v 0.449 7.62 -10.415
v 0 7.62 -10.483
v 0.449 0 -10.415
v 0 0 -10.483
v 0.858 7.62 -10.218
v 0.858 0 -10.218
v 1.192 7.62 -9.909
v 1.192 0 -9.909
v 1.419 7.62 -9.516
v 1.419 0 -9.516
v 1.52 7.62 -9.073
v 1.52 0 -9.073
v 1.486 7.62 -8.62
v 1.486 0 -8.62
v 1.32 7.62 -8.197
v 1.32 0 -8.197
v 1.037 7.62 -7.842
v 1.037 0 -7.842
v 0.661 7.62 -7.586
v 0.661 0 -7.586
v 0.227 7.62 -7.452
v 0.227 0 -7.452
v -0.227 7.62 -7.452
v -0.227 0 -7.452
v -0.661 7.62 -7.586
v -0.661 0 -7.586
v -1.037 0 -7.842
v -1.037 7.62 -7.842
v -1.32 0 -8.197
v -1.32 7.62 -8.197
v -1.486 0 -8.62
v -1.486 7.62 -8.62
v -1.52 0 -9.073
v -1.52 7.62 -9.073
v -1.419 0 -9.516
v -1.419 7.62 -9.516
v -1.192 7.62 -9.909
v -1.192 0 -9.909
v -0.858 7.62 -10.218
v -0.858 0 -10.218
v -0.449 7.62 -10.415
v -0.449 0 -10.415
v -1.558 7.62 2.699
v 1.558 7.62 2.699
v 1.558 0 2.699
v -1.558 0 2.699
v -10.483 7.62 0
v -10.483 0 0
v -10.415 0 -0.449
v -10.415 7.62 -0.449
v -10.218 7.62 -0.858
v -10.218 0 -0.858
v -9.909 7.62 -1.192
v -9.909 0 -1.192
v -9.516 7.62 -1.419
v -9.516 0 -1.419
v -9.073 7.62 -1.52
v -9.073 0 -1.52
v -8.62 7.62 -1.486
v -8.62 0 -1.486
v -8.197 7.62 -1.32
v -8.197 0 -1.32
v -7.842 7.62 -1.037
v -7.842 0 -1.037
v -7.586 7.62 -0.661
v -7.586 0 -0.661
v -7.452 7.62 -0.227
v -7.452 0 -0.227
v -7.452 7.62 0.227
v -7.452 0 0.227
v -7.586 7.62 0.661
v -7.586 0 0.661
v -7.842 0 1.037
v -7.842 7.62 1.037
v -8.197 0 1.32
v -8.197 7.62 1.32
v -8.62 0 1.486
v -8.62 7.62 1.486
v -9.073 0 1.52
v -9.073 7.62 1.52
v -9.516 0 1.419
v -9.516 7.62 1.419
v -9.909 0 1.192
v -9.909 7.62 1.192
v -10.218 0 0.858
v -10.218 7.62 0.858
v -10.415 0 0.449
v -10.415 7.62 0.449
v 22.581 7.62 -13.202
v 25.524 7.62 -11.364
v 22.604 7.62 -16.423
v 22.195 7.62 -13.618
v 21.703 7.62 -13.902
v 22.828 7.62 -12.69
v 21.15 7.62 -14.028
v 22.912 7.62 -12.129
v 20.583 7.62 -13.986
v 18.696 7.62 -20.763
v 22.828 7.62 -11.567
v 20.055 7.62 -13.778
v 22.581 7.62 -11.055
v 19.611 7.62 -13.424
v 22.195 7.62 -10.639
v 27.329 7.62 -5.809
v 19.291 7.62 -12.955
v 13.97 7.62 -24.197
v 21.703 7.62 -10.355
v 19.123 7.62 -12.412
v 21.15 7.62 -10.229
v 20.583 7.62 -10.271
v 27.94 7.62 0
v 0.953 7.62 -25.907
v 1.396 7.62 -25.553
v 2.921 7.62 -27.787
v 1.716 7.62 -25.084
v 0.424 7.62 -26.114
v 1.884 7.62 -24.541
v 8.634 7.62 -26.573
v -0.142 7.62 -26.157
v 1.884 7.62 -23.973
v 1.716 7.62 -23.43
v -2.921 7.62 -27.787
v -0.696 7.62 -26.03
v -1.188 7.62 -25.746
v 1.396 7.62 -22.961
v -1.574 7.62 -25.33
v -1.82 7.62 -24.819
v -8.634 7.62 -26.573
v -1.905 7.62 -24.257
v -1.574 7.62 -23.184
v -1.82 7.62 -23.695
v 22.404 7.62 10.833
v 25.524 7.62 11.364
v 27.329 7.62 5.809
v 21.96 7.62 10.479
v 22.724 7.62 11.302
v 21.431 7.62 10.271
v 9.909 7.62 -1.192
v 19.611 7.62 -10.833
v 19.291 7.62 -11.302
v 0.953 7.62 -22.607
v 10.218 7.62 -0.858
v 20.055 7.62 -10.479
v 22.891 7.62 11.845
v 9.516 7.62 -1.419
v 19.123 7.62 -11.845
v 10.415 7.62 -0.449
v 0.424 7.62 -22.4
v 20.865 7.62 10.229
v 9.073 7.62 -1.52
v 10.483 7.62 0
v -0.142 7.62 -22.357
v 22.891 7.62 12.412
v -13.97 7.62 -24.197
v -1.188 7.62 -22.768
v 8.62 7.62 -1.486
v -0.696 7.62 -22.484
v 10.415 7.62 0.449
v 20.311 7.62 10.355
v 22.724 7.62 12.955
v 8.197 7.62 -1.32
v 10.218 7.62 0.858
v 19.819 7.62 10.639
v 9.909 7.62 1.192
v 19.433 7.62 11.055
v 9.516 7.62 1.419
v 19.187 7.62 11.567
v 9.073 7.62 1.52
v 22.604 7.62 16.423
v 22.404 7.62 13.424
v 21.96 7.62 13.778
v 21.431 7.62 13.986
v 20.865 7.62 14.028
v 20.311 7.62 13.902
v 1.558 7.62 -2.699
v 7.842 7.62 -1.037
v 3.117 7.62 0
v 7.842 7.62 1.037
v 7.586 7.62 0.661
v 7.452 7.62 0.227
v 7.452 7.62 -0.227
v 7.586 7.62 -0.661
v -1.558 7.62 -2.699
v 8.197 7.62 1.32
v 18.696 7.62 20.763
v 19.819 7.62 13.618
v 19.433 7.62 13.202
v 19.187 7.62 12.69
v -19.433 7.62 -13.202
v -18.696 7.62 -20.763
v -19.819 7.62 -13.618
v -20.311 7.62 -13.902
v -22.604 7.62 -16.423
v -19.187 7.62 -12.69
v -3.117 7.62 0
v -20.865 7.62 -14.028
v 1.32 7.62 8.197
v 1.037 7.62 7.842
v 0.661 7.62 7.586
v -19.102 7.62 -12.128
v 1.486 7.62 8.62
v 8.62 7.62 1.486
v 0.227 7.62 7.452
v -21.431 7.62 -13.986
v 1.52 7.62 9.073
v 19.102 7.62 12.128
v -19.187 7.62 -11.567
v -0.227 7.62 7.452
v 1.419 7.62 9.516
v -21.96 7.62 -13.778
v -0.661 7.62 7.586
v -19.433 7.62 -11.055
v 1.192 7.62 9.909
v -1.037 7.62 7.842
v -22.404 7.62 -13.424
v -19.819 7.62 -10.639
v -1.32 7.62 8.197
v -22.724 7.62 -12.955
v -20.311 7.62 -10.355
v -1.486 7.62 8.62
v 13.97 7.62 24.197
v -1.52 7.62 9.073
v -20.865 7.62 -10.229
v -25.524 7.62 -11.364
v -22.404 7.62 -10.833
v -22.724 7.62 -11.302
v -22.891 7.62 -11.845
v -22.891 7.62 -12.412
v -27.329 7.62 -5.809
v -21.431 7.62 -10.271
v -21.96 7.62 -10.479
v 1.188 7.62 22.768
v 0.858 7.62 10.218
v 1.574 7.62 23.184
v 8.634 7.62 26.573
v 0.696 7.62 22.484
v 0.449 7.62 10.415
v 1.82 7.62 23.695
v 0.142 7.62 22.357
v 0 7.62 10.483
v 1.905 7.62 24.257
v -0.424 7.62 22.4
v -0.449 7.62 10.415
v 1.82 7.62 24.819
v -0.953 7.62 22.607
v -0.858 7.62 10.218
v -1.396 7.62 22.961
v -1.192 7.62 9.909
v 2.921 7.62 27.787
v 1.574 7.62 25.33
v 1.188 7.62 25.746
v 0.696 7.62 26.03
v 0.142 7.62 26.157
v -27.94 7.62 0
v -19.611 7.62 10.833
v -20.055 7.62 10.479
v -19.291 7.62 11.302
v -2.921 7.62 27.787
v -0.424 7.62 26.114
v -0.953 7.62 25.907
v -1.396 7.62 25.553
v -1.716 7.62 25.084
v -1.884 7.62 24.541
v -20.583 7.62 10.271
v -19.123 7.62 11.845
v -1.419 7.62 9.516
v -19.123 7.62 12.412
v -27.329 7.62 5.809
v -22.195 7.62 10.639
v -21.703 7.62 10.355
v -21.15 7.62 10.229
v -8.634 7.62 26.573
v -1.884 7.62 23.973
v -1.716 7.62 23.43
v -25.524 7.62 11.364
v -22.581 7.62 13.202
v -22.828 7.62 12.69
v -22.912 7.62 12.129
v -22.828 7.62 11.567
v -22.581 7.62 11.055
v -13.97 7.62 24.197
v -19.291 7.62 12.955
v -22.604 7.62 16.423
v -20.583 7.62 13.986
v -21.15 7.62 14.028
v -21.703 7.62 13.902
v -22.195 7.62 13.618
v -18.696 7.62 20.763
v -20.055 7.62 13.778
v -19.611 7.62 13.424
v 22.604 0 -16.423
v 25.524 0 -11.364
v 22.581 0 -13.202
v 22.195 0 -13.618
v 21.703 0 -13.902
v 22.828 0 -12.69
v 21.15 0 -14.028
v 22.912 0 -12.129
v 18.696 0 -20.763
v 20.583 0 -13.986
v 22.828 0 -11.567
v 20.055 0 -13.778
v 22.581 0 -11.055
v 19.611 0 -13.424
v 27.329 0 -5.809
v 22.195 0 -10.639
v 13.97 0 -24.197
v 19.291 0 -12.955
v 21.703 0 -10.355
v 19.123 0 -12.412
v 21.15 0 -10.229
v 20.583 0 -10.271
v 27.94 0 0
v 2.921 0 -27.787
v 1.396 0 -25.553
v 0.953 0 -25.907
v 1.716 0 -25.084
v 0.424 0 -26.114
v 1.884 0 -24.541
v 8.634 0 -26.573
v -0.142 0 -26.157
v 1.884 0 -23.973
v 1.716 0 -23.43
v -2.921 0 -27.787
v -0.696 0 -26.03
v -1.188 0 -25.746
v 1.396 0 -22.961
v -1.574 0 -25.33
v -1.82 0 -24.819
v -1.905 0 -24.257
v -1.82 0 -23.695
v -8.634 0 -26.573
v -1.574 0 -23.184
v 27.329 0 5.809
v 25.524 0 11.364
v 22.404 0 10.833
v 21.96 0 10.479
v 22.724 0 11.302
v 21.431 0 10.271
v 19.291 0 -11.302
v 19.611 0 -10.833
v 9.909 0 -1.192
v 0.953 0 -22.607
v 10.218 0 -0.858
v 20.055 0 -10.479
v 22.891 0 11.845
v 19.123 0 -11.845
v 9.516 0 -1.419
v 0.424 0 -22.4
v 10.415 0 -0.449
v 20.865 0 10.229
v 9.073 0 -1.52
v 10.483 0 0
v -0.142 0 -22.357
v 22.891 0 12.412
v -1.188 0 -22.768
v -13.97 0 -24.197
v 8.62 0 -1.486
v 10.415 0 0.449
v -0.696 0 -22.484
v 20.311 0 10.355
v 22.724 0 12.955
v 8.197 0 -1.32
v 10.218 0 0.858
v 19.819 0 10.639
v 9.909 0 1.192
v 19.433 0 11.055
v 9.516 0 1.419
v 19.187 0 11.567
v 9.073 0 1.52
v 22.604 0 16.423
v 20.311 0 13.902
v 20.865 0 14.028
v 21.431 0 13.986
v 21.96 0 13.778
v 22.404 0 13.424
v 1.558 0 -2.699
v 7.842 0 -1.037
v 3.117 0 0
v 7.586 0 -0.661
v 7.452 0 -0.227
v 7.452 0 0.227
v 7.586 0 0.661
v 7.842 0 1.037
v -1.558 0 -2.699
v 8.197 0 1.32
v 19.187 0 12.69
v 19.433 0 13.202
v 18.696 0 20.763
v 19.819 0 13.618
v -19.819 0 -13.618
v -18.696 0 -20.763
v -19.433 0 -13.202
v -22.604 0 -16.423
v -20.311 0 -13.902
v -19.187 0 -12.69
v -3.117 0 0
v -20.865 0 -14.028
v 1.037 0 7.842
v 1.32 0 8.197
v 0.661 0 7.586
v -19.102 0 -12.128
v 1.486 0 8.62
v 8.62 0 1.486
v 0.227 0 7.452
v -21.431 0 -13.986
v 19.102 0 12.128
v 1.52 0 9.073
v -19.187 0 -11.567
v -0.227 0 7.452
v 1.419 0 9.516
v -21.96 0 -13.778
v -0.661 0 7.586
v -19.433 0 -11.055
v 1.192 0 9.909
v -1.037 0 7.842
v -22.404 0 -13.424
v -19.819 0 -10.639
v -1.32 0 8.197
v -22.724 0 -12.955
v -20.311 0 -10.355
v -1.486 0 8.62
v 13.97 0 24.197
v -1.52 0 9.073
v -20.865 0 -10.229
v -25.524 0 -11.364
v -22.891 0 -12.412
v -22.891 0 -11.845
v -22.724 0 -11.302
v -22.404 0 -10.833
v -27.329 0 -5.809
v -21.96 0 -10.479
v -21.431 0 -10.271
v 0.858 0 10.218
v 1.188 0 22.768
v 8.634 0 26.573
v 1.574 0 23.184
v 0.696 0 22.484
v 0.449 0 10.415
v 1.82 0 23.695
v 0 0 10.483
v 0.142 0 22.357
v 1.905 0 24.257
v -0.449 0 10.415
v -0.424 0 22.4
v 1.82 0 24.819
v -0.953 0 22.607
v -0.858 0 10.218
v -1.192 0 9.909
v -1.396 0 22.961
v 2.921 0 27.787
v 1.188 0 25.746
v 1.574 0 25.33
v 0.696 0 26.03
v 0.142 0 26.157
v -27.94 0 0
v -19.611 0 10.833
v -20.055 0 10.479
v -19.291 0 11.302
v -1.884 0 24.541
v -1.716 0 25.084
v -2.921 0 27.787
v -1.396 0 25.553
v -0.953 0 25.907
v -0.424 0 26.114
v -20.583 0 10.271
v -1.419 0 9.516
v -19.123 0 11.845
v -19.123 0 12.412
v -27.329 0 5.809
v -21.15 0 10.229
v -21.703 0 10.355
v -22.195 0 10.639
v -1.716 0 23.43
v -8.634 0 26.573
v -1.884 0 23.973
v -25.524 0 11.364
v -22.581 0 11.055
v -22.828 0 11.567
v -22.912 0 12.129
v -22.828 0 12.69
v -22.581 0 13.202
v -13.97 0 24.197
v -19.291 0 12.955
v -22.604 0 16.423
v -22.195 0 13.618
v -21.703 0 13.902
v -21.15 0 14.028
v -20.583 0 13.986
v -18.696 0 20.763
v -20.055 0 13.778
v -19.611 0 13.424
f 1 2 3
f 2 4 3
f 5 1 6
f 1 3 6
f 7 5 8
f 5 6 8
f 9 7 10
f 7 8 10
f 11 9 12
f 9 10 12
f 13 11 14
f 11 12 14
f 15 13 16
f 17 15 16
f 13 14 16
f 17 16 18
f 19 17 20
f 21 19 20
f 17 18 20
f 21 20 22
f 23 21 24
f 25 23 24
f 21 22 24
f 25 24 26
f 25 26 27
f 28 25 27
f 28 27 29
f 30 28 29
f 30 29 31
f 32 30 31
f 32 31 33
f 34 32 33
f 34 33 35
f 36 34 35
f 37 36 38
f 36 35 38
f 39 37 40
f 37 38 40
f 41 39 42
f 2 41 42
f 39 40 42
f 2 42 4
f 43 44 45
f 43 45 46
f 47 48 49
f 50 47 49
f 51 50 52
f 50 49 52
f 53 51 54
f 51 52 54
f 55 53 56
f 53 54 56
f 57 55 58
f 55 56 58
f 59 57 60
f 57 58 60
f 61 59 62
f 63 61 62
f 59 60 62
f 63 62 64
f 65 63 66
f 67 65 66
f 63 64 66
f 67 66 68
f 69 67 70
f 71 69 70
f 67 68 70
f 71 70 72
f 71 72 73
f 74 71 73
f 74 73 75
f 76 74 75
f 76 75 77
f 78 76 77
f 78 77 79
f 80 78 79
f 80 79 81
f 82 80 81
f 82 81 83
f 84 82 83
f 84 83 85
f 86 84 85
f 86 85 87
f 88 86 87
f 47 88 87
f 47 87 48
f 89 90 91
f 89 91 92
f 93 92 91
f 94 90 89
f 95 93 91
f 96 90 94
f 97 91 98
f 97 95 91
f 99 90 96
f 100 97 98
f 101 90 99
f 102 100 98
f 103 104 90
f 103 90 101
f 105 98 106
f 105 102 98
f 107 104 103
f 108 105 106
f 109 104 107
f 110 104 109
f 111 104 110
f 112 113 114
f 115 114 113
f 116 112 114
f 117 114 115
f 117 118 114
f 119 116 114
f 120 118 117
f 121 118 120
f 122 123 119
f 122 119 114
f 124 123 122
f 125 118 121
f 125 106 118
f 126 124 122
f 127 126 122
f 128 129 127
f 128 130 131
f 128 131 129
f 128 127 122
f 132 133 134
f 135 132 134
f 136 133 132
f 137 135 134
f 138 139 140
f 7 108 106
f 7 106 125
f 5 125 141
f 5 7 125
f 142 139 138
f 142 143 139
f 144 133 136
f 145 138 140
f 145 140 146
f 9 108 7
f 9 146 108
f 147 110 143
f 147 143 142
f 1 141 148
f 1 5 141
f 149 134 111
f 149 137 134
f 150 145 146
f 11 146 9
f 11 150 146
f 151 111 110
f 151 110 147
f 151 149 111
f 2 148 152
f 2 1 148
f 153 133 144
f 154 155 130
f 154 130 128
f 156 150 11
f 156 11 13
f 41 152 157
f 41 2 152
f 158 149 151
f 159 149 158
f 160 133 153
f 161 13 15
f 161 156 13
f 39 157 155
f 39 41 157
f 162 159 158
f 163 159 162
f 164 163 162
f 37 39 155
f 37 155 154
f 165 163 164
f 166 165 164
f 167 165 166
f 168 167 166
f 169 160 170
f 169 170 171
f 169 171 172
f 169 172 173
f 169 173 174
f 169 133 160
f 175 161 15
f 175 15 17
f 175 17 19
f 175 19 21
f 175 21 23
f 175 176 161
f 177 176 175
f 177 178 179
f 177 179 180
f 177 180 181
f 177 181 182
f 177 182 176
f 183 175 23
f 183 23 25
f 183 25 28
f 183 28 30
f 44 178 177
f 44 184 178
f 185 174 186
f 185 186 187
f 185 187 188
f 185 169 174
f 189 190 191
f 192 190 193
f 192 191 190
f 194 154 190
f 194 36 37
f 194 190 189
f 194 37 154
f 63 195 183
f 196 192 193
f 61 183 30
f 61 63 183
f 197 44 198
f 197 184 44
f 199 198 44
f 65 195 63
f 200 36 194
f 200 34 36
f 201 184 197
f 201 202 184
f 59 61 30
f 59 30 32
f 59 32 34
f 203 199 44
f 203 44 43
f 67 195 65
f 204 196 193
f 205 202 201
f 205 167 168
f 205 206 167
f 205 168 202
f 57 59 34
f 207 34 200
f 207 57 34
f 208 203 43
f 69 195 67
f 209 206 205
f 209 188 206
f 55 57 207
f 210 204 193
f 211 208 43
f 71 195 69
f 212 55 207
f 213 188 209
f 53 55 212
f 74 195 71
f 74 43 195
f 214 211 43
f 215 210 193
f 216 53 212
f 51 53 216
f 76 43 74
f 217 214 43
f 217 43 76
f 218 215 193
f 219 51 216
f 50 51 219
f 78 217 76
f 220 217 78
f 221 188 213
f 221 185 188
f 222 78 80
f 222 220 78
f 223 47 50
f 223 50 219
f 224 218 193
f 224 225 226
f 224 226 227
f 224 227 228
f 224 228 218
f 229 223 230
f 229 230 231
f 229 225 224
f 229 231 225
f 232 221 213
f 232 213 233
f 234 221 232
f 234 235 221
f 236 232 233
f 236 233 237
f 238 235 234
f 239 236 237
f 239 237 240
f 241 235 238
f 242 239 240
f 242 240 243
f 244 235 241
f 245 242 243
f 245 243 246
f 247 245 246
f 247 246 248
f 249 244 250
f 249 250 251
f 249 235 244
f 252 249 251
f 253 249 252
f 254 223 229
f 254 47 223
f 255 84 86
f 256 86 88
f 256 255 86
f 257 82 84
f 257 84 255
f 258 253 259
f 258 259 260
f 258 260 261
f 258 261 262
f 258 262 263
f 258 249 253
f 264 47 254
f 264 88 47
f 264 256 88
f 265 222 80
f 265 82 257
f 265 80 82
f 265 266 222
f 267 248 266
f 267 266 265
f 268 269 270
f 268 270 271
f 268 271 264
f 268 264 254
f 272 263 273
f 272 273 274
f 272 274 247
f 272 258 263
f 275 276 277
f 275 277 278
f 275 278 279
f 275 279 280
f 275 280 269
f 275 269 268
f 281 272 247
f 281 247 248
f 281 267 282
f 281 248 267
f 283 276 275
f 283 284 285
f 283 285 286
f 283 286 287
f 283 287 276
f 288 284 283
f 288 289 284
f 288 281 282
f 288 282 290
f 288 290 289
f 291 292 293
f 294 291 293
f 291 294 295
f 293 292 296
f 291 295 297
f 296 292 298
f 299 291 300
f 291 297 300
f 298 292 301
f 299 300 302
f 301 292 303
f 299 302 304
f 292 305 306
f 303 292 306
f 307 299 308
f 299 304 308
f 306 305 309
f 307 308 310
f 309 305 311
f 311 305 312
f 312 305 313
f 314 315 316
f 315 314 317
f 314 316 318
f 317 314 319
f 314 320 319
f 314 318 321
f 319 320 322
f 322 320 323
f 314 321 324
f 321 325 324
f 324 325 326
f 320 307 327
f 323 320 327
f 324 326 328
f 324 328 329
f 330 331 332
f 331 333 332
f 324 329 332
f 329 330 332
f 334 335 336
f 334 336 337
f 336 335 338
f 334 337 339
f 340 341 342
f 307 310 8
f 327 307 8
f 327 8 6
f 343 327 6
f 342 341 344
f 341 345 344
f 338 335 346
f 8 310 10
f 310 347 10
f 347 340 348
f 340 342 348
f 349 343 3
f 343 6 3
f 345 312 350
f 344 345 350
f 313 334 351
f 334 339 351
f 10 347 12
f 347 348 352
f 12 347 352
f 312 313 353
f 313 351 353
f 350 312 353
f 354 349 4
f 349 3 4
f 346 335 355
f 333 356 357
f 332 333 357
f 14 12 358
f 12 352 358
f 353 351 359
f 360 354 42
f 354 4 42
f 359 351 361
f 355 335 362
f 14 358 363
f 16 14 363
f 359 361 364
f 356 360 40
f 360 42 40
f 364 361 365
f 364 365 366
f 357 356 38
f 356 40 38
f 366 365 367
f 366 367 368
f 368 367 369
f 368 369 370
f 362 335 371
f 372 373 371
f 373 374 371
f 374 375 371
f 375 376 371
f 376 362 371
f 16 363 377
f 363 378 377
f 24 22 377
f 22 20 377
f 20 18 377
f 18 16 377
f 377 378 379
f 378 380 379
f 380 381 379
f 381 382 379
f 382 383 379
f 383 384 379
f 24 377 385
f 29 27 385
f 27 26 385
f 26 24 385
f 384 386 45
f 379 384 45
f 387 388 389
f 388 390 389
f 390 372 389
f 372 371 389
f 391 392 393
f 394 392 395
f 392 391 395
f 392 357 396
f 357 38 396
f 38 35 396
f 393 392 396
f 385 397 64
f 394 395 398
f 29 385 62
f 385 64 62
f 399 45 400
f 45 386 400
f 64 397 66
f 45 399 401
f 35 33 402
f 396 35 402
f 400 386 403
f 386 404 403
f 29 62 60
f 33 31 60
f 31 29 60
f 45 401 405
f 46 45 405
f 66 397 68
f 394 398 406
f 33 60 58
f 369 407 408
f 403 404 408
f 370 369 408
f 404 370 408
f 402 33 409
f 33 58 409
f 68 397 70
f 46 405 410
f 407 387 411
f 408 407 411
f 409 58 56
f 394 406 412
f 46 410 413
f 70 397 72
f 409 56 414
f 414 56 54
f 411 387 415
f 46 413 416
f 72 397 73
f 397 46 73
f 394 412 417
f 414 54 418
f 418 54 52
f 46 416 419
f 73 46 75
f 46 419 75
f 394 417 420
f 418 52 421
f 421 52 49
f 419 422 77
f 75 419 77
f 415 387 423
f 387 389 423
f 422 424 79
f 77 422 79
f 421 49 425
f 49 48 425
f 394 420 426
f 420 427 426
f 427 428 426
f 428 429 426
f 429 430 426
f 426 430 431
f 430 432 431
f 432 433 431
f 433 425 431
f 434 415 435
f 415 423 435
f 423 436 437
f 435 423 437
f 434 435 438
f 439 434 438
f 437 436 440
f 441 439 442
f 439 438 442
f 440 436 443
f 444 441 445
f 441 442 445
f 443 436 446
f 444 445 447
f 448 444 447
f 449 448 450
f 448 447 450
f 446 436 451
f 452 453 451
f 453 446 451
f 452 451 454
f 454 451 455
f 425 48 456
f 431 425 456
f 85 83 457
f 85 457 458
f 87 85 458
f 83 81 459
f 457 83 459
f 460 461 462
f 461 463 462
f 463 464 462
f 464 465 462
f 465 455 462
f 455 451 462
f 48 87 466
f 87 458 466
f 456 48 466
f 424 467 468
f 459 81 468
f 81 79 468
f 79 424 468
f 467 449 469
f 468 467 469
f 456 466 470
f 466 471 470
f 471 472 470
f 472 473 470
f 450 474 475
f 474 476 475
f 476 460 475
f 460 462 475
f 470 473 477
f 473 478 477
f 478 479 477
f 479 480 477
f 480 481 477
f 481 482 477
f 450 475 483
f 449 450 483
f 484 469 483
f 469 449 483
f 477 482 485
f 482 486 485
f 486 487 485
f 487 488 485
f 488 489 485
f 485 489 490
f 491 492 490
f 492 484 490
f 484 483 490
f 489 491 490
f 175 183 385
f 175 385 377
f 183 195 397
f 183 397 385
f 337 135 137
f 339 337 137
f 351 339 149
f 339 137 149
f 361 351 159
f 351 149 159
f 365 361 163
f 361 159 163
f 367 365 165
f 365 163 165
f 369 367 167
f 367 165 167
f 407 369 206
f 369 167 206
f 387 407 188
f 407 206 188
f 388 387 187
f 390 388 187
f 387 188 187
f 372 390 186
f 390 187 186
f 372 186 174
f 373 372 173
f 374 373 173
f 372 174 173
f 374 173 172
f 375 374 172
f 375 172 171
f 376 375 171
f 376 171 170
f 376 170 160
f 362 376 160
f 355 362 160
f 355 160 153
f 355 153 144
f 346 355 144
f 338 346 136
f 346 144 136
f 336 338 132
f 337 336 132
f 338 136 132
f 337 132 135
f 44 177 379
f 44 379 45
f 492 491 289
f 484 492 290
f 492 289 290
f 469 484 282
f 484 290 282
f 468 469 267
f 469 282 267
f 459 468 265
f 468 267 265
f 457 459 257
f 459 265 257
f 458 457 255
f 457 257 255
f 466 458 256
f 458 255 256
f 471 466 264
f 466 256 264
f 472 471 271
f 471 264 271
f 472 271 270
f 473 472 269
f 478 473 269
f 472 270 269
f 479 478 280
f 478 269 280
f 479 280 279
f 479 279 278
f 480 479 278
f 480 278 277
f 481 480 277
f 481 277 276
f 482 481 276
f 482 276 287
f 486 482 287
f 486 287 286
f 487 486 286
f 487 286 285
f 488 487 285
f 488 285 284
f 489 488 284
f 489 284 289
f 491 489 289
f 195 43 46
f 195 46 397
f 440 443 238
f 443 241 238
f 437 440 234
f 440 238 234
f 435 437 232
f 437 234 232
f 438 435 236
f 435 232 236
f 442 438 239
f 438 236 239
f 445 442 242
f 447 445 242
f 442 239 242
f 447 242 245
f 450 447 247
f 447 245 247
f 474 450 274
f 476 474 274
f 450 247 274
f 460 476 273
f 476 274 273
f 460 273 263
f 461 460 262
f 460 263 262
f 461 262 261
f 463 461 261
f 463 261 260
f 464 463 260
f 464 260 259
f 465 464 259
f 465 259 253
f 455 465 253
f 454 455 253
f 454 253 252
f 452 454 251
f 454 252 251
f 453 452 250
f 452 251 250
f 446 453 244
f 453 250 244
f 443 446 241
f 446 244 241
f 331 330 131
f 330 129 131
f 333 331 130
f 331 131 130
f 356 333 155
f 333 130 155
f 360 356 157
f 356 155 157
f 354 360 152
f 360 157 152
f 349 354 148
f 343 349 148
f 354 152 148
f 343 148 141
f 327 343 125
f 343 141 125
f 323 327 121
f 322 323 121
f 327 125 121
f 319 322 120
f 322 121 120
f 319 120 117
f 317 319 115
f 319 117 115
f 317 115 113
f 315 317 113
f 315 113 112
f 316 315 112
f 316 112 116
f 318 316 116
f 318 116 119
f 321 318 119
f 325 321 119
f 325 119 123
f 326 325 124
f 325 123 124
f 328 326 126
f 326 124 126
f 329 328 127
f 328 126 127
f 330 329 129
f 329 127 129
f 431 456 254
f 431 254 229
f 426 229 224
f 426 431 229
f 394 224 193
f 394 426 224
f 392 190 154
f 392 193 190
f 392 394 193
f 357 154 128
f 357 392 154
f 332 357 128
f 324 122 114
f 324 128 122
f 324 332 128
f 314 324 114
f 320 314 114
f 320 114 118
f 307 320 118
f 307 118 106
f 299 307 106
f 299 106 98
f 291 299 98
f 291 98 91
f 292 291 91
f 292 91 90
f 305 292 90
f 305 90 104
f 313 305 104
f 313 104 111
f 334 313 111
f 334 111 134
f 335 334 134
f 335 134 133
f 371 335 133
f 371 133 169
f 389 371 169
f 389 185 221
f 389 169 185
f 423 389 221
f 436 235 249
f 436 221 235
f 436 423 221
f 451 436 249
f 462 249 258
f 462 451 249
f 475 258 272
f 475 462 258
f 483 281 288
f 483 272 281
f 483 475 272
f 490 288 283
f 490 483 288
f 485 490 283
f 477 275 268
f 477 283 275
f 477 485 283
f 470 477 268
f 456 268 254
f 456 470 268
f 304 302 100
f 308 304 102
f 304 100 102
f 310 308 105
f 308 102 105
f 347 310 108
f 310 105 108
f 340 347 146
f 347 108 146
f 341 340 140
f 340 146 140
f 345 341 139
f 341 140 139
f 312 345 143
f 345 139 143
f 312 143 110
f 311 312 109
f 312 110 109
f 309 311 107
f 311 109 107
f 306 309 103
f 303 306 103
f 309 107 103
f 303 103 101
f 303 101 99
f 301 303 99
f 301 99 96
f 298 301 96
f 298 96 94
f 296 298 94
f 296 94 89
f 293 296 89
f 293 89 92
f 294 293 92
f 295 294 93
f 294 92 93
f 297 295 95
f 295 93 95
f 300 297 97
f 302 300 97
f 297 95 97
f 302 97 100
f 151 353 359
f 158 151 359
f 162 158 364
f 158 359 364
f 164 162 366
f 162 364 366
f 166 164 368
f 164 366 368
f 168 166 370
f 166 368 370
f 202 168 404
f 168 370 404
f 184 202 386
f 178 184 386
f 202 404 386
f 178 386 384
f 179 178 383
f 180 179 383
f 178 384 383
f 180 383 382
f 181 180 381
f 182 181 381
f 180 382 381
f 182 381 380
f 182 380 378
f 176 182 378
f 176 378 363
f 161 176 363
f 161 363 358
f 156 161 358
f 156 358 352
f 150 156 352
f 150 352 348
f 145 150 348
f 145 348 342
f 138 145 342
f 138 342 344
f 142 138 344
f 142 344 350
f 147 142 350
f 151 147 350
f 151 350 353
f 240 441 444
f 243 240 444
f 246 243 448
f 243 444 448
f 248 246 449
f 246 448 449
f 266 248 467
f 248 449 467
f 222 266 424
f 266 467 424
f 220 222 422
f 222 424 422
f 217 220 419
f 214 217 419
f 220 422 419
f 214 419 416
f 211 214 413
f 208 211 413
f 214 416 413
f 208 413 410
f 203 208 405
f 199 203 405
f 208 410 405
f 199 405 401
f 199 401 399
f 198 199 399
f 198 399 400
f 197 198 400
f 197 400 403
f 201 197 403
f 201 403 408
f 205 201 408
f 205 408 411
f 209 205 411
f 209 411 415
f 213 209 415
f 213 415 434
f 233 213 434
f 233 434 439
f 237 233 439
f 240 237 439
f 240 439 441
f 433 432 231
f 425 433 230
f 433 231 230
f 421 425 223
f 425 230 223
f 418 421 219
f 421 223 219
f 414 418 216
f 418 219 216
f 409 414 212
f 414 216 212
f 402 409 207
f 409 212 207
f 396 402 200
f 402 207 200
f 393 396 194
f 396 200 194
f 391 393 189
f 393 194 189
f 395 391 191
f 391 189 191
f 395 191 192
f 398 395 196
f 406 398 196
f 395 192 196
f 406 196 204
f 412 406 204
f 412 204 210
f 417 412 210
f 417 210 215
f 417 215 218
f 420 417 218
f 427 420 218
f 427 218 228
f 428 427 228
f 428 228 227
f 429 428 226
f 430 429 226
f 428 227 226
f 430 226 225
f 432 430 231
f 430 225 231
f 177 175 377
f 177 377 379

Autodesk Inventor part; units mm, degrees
ref_plane "YZ Plane" through (0, 0, 0) normal (1, 0, 0) x (0, 1, 0)
ref_plane "XZ Plane" through (0, 0, 0) normal (0, 1, 0) x (-1, 0, 0)
ref_plane "XY Plane" through (0, 0, 0) normal (0, 0, 1) x (1, 0, 0)
sketch "Sketch1" plane through (0, 0, 0) normal (0, 1, 0) x (-1, 0, 0)
  circle A0 centre (0, 0) radius 27.94
  dimension "d0" = 55.88
extrude "Extrusion1" add sketch "Sketch1" along normal blind 7.62
ref_plane "Work Plane5" through (0, 21.082, 0) normal (0, 1, 0) x (1, 0, 0)
sketch "Sketch5" plane through (0, 21.082, 0) normal (0, 1, 0) x (1, 0, 0)
  line L0 (0, 0) -> (0, 2.667)
  line L1 (-3.1168, 0) -> (-1.5584, 2.6992)
  line L2 (-1.5584, 2.6992) -> (1.5584, 2.6992)
  line L3 (1.5584, 2.6992) -> (3.1168, 0)
  line L4 (3.1168, 0) -> (1.5584, -2.6992)
  line L5 (1.5584, -2.6992) -> (-1.5584, -2.6992)
  line L6 (-1.5584, -2.6992) -> (-3.1168, 0)
  dimension "d10" = 2.667
extrude "Extrusion4" cut sketch "Sketch5" against normal blind 25.4
sketch "Sketch6" plane through (0, 7.62, 0) normal (0, 1, 0) x (1, 0, 0)
  circle A0 centre (0, 0) radius 27.94 projected
  line L0 (0, -27.94) -> (0, -26.162)
  line L1 (0, -26.162) -> (0, -24.257)
  circle A1 centre (0, -24.257) radius 1.905
  dimension "d13" = 1.778
  dimension "d14" = 1.905
extrude "Extrusion5" cut sketch "Sketch6" against normal blind 25.4 contours A1
ref_plane "Work Plane6" through (0, 21.082, 0) normal (0, 1, 0) x (1, 0, 0)
pattern_circular "Circular Pattern1" count 6 over 360 about axis through (0, 21.082, 0) along (0, 1, 0) of "Extrusion5"
sketch "Sketch8" plane through (0, 0, 0) normal (0, -1, 0) x (1, 0, 0)
  line L0 (3.1168, 0) -> (1.5584, -2.6992) projected
  line L1 (3.1168, 0) -> (7.4348, 0)
  line L2 (7.4348, 0) -> (8.9588, 0)
  circle A0 centre (8.9588, 0) radius 1.524
  point P0 (0, 0)
  dimension "d20" = 4.318
  dimension "d21" = 1.524
extrude "Extrusion6" cut sketch "Sketch8" against normal blind 25.4
pattern_circular "Circular Pattern2" count 4 over 360 about axis through (0, 21.082, 0) along (0, 1, 0) of "Extrusion6"
properties part number "Wheel Mount"
